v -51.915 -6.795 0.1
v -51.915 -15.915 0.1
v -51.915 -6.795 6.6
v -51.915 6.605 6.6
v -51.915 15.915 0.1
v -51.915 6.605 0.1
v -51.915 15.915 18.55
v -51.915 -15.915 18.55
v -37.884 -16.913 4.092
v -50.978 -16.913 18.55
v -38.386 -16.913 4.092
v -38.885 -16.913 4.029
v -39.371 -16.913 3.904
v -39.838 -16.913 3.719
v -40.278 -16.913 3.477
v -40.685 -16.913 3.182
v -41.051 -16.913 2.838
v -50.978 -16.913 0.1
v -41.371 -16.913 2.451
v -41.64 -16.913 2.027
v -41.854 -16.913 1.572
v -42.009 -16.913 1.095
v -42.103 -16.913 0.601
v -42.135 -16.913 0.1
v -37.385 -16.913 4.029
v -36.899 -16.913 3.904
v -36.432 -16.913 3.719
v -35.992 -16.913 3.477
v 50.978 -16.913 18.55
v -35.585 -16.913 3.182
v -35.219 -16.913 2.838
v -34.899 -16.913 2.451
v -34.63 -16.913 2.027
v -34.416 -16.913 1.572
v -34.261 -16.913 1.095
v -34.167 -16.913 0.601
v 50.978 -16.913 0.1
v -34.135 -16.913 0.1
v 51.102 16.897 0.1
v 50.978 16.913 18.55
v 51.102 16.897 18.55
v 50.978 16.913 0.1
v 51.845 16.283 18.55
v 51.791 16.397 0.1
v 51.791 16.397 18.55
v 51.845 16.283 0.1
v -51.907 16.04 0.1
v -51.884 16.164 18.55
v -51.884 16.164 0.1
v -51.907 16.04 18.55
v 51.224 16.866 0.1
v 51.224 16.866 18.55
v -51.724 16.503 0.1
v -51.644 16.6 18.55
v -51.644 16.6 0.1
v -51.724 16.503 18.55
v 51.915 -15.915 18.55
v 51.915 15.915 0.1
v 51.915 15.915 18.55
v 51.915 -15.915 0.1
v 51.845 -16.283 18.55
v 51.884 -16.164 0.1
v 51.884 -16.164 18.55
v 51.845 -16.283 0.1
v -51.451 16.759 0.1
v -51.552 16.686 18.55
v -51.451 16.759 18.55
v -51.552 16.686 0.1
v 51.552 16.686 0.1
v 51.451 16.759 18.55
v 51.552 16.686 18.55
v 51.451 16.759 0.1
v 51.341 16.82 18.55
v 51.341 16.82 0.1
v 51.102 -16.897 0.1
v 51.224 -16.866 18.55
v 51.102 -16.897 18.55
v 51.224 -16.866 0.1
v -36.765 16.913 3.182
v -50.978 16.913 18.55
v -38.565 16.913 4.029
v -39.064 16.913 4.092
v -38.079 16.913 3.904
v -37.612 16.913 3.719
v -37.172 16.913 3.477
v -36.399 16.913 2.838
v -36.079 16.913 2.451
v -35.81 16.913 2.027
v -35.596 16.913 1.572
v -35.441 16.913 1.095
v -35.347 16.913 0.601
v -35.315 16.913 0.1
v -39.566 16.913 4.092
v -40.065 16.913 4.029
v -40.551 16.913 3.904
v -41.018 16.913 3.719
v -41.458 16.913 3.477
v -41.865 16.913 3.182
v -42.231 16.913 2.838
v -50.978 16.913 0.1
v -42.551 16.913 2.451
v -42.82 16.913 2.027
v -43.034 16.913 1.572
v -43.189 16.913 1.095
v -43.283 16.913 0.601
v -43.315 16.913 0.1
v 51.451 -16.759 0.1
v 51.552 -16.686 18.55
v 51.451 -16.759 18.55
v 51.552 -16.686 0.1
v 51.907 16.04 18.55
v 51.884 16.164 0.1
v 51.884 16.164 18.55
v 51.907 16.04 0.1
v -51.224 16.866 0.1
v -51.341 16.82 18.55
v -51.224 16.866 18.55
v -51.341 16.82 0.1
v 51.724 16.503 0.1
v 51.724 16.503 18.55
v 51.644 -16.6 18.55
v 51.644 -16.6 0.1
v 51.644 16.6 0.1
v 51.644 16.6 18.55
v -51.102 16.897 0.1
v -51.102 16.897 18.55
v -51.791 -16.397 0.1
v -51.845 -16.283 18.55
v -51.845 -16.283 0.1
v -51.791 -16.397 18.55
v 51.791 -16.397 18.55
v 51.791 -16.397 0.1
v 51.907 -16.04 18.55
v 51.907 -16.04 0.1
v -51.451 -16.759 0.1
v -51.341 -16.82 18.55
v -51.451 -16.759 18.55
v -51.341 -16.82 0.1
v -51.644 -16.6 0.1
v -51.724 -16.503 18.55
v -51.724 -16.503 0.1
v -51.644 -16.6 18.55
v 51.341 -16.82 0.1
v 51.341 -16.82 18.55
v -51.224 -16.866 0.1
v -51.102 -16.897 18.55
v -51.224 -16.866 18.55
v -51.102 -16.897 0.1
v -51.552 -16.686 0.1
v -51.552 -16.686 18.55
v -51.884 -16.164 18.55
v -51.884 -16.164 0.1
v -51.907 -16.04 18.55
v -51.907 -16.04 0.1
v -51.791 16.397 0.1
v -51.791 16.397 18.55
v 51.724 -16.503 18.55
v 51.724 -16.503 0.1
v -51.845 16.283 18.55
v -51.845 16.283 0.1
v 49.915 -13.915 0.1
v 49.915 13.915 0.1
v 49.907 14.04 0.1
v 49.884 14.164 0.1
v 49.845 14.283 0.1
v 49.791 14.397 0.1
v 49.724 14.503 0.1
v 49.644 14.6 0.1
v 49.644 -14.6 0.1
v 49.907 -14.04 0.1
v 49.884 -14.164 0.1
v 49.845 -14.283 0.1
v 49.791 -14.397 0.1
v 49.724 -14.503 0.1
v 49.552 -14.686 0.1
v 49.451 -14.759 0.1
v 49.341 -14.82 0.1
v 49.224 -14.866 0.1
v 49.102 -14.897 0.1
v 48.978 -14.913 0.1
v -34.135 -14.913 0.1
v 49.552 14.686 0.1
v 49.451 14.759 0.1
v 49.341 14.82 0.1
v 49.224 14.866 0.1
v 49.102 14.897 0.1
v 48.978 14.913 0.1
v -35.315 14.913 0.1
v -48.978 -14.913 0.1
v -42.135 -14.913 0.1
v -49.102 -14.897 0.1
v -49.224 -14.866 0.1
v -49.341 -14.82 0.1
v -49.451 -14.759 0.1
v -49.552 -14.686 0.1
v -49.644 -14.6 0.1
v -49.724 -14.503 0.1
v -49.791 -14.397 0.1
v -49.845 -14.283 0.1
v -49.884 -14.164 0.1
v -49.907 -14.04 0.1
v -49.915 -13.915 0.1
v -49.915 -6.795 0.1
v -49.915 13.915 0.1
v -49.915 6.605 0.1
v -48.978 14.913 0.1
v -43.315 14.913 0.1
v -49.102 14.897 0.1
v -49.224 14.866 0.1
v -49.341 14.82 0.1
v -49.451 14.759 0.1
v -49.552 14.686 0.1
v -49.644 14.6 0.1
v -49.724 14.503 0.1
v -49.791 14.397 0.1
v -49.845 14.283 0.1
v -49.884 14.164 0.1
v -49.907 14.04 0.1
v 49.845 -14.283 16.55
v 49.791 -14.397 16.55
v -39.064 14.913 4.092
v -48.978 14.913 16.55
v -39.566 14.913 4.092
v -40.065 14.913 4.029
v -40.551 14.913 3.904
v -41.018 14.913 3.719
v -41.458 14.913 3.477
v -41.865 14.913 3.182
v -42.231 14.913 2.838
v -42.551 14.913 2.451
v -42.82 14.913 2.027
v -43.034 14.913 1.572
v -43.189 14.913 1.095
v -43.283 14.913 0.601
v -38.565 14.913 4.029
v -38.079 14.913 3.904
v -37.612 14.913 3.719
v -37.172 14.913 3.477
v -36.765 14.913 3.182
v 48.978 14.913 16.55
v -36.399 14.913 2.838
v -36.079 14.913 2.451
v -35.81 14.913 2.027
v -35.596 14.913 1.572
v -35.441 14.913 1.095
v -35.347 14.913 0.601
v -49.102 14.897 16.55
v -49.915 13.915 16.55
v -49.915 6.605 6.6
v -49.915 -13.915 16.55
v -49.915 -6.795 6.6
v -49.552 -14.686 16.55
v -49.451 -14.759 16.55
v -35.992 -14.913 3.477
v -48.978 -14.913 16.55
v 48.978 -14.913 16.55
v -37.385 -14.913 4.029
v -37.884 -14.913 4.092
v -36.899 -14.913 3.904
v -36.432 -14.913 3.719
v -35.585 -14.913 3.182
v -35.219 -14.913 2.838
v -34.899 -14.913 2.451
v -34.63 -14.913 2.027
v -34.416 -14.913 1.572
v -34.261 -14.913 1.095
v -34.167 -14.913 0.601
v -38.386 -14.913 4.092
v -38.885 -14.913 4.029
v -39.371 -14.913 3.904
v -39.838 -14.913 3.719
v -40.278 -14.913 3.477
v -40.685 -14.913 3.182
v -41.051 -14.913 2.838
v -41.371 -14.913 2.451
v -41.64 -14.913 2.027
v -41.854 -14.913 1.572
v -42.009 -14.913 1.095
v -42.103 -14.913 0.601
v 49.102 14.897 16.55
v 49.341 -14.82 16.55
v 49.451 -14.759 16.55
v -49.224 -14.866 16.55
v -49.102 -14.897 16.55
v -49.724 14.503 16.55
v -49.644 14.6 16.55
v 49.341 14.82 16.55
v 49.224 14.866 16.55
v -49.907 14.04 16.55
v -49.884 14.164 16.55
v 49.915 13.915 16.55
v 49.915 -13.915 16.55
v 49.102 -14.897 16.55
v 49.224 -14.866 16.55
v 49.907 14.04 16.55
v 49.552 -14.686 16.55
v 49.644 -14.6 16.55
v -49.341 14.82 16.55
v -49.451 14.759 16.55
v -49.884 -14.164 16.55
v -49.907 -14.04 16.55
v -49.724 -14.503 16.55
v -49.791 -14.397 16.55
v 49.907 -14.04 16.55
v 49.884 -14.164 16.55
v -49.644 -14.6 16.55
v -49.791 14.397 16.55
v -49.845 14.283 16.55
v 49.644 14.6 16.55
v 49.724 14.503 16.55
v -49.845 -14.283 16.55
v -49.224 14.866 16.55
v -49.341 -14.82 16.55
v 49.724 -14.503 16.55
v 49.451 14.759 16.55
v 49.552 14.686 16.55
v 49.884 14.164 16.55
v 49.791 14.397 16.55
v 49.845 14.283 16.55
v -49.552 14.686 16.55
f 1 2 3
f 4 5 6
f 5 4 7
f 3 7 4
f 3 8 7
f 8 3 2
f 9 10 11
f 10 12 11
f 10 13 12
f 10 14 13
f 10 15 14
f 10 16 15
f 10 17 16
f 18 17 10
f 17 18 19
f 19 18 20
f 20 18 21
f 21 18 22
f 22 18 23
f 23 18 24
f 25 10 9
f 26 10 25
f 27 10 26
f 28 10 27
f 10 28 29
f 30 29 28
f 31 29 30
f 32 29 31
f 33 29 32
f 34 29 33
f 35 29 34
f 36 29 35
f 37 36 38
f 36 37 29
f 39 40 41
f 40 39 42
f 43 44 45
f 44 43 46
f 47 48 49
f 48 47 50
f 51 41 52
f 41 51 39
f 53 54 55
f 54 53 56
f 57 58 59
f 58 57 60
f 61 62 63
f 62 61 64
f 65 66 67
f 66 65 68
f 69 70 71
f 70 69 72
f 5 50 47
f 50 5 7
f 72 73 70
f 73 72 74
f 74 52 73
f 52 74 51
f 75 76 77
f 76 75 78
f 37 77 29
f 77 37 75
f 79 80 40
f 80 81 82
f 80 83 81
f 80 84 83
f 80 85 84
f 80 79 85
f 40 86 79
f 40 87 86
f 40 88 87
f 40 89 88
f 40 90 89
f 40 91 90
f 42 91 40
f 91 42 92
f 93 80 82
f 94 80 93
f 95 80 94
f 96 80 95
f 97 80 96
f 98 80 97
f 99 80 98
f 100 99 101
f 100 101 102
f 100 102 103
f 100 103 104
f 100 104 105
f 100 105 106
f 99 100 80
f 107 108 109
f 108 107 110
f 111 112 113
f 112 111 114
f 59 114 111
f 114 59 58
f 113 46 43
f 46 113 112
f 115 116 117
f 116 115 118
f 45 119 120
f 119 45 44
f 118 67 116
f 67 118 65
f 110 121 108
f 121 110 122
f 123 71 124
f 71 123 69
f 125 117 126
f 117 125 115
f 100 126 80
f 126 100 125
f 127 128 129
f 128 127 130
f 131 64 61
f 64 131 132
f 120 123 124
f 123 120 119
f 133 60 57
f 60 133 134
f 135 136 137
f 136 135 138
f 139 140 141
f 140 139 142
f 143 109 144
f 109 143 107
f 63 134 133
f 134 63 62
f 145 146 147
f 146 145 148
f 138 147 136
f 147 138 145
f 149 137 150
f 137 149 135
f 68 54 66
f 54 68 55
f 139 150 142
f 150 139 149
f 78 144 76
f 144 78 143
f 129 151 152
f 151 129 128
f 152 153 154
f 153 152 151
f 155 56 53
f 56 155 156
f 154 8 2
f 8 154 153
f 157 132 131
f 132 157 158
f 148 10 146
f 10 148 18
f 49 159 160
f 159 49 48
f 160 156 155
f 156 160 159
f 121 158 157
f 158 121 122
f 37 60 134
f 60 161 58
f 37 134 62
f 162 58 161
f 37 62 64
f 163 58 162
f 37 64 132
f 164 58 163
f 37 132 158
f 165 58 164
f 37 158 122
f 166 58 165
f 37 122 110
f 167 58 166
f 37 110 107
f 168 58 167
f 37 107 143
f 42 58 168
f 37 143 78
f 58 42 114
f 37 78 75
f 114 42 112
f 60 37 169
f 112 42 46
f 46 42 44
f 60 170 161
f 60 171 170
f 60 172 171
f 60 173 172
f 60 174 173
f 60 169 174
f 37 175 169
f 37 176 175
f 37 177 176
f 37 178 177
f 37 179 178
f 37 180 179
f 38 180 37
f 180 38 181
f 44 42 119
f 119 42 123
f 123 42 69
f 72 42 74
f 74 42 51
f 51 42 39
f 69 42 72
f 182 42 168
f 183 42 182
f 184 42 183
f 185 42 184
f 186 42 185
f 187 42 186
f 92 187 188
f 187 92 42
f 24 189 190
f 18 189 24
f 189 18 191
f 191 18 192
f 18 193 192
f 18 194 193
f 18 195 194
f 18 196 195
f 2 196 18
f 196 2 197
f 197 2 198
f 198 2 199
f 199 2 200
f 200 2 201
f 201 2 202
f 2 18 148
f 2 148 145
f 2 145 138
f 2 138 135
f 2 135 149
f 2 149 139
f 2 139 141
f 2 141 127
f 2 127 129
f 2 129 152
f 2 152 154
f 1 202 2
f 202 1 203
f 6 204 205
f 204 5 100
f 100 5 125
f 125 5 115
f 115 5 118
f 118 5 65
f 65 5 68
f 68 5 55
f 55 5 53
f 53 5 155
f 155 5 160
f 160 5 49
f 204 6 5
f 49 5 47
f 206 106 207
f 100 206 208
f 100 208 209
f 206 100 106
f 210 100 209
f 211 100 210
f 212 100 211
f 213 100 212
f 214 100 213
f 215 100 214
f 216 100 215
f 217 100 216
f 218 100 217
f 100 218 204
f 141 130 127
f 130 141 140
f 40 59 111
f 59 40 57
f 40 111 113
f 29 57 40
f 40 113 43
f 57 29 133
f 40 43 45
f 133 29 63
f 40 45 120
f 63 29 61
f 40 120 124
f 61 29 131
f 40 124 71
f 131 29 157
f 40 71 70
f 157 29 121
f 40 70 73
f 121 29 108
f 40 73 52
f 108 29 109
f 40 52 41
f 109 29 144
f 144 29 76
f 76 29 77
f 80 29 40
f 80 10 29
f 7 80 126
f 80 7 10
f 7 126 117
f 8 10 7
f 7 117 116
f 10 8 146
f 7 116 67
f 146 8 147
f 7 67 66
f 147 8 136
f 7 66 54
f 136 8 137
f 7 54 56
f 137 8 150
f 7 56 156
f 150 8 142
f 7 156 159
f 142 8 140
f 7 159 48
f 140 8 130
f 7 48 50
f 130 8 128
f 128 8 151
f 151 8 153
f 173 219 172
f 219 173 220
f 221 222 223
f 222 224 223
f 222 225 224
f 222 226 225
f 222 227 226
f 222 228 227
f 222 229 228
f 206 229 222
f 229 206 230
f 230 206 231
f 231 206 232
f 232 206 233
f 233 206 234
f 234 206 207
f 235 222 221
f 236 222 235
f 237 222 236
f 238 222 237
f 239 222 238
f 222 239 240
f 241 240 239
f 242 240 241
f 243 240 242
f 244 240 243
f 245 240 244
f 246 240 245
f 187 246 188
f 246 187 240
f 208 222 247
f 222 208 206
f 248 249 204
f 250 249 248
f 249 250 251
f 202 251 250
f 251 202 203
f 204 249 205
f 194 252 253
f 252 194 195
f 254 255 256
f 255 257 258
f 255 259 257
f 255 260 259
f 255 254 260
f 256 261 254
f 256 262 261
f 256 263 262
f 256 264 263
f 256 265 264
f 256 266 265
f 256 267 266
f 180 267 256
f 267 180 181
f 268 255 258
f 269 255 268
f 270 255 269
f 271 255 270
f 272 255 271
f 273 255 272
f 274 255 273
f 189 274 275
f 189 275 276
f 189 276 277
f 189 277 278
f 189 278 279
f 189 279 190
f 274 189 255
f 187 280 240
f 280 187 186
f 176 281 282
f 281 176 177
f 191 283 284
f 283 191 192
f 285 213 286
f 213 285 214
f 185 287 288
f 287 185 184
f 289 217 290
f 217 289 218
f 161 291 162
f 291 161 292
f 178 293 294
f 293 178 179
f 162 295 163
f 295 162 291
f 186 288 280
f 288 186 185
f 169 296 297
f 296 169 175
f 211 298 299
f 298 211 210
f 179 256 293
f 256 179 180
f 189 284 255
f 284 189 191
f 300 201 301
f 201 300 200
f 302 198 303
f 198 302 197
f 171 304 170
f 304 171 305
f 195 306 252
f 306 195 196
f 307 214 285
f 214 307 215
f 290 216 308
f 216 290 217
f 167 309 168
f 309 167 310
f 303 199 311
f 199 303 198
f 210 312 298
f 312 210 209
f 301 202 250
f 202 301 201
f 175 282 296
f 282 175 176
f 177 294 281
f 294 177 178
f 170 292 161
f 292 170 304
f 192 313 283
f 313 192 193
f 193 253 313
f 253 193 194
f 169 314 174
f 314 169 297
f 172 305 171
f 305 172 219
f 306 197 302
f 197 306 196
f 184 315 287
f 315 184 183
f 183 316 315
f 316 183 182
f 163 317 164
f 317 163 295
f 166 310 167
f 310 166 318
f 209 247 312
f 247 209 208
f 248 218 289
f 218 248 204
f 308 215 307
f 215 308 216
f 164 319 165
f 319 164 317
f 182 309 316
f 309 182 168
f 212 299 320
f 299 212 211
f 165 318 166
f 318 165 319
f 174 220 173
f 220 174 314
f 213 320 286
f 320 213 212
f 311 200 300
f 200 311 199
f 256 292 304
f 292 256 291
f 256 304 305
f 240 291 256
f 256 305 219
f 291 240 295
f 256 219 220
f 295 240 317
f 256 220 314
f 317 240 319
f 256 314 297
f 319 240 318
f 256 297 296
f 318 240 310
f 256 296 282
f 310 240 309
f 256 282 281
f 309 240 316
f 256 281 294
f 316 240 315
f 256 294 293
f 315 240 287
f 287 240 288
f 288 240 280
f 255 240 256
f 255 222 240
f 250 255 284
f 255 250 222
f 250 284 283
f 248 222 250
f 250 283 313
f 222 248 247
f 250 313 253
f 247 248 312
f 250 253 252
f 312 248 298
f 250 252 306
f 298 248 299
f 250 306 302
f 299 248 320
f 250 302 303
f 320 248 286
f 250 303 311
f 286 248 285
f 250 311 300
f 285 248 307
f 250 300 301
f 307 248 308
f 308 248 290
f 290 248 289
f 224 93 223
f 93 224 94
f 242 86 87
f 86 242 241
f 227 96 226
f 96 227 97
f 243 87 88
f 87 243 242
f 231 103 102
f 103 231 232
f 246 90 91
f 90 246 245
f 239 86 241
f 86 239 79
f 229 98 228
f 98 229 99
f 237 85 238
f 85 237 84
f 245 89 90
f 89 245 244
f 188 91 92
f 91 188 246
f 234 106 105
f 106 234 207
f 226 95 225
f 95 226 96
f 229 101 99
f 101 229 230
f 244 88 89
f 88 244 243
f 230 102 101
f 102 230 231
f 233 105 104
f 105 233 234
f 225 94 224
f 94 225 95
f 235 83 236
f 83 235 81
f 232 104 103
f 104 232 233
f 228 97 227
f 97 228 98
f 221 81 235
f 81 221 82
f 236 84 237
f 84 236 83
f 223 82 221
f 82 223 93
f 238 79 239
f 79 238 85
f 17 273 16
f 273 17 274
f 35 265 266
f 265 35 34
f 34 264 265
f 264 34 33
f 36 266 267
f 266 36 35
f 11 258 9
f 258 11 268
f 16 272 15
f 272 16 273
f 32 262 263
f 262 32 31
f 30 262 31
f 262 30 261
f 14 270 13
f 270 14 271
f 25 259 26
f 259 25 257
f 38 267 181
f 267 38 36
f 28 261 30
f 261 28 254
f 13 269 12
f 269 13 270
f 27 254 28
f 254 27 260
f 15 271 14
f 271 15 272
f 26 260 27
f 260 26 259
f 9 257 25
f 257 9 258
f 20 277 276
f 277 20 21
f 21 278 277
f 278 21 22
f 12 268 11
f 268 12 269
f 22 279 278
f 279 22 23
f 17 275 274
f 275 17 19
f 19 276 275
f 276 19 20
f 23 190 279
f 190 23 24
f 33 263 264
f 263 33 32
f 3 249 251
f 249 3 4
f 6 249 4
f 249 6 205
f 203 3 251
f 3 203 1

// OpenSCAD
// file: usbA-C.scad
/* [Hidden] */

TWEAK = 1;

module make_USBA(location = "UNKNOWN")
{
     // true measurements of usb.
     PUNCH_DIA = 6 + TWEAK;
     PUNCH_WIDTH = 11.0 + TWEAK;
     PUNCH_DIST = PUNCH_WIDTH - PUNCH_DIA;
     PUNCH_LENGTH = 17.0;

     // this is the hole punch size
     USB_DIA = 1.92 + TWEAK/2;
     USB_WIDTH = 7.0 + TWEAK/2;
     USB_DIST = PUNCH_WIDTH - PUNCH_DIA;
     USB_LENGTH = 5.68;
    

    mUSB_DIA = (location == "ABOVE") ? +USB_DIA/2 : location == "BELOW" ? -USB_DIA/2: 0;
    
    translate([ 0, mUSB_DIA, 0])  
    {
         if ($preview)
         {
             color("PINK")
             translate( [-PUNCH_WIDTH , -mUSB_DIA, 0])  // one face to sit 'on the board'
             rotate([90, 90, 0])
             cube( [PUNCH_WIDTH * 2, PUNCH_WIDTH * 2, 0.1], center = false);    // targeting plane
         }
         
         //translate( [0, USB_DIA/2, 0])  // one face to sit 'on the board'
         {
             color("YELLOW", .3)
             hull()
             {
                 translate([ PUNCH_DIST /2, 0, 0 ])
                 cylinder(h = PUNCH_LENGTH, d = PUNCH_DIA, $fn=100);
                 
                 translate([ -PUNCH_DIST /2, 0, 0 ])
                 cylinder(h = PUNCH_LENGTH, d = PUNCH_DIA, $fn=100);
             }
             
             rotate([180, 0, 0])
             #hull()
             {
                 translate([ USB_DIST /2, 0, 0 ])
                 cylinder(h = USB_LENGTH, d = USB_DIA, $fn=100);
                 
                 translate([ -USB_DIST /2, 0, 0 ])
                 cylinder(h = USB_LENGTH, d = USB_DIA, $fn=100);
             }
         }
     }
}

module make_USBC( location = "UNKNOWN")
{
     PUNCH_DIA = 6.10 + TWEAK;
     PUNCH_WIDTH = 10.9 + TWEAK;
     PUNCH_DIST = PUNCH_WIDTH - PUNCH_DIA;
     PUNCH_LENGTH = 14.0;

    // true usb metal dimensions.
     USB_DIA = 2.54 + TWEAK/2;
     USB_WIDTH = 8.25 + TWEAK/2;
     USB_DIST = PUNCH_WIDTH - PUNCH_DIA;
     USB_LENGTH = 7.47;

    mUSB_DIA = (location == "ABOVE") ? +USB_DIA/2 : location == "BELOW" ? -USB_DIA/2: 0;
    
    translate([ 0, mUSB_DIA, 0])  
    {
         if ($preview)
         {
             color("GREY")
             translate( [-PUNCH_WIDTH , -mUSB_DIA, 0])  // one face to sit 'on the board'
             rotate([90, 90, 0])
             cube( [PUNCH_WIDTH * 2, PUNCH_WIDTH * 2, 0.1], center = false);    // targeting plane
         }
         
         //translate( [0, USB_DIA/2, 0])  // one face to sit 'on the board'
         {
             color("ORANGE", .3)
             hull()
             {
                 translate([ PUNCH_DIST /2, 0, 0 ])
                 cylinder(h = PUNCH_LENGTH, d = PUNCH_DIA, $fn=100);
                 
                 translate([ -PUNCH_DIST /2, 0, 0 ])
                 cylinder(h = PUNCH_LENGTH, d = PUNCH_DIA, $fn=100);
             }
             
             rotate([180, 0, 0])
             #hull()
             {
                 translate([ USB_DIST /2, 0, 0 ])
                 cylinder(h = USB_LENGTH, d = USB_DIA, $fn=100);
                 
                 translate([ -USB_DIST /2, 0, 0 ])
                 cylinder(h = USB_LENGTH, d = USB_DIA, $fn=100);
             }
         }
     }

}
translate([20, 0, 0])
make_USBA("ABOVE");
translate([40,0, 0])
make_USBA("CENTER");
translate([60, 0, 0])
make_USBA("BELOW");
/*
translate([ 0, 10, 0])
{
    translate([20, 0, 0])
    make_USBC("ABOVE");
    translate([40,0, 0])
    make_USBC("CENTER");
    translate([60, 0, 0])
    make_USBC("BELOW");
}
*/
//make_USBC("CENTER");
// main file
//outside dimensions of the box
use <usbA-C.scad>

wall_thickness = 4;     // total thickness of any wall

inside_dims= 1;
FUDGE = .5;

board_width  = 99.33;        //x dimension
board_length = 29.33;        //y dimension
board_height = 6.31;         //z MAX COMPONENT HEIGHT
board_thick = 1.58;

make_bottom = false;
make_top = true;

box_width  = board_width + (inside_dims ? wall_thickness : 0) + FUDGE;        //x dimension
box_length = board_length + (inside_dims ? wall_thickness : 0) + FUDGE;        //y dimension
box_height = board_height  + (inside_dims ? wall_thickness : 0) + 3;            //z dimension


$fn=50;
echo ("box_width= ", box_width, "box_length = ", box_length, "box_height =", box_height);

//additional parameters
corner_radius = 1;      // radius of box corners

post_diameter = 3.5;         // internal post for screws
hole_diameter = 2;           // size of screws for lid (0=no screws)
lid_thickness= 2;            // comment out if no lid required
lid_lip = 2; // 1.57 exact   // 0 makes lid flush to top
lid_tolerance = .5;          // shrink lid so not squeaky fit

fn=50;

// make 4 "posts" about 0,0,0 offset by +/-x +/-y 
module posts(x,y,z,h,r)
{
    translate([x,y,z]){         // move post to this location
        cylinder(r = r, h = h); // make one post
    }
    translate([-x,y,z]){        // move post to this location
        cylinder(r = r, h = h); // make one post
    }   
    translate([-x,-y,z]){       // move post to this location
        cylinder(r = r, h = h); // make one post
    }
    translate([x,-y,z]){        // move post to this location
        cylinder(r = r, h = h); // make one post
    }    
}


x_inside = (box_width/2  - corner_radius - wall_thickness); 
y_inside = (box_length/2 - corner_radius - wall_thickness);
z_inside_top = (box_height - wall_thickness);

if (make_bottom)
{
    translate([ 0, 0, -box_height +.1])
    {
        difference () 
        {
            union()
            {
                difference() // make 2 boxes one inside the other and remove "inside box" from "outside box"
                {
                 
                    // use posts to define OUTSIDE of a solid box centered on 0,0
                    hull(){
                        // outside of box. This sits on 0,0,0 center
                        posts(  
                            x=(box_width/2  - corner_radius),
                            y=(box_length/2 - corner_radius),
                            z= 0,
                            h= box_height,
                            r = corner_radius);
                    }
                        
                    // use posts to define INSIDE of a solid box centered on 0,0
                    
                    hull(){
                        posts(
                            x= x_inside,
                            y= y_inside,
                            z= wall_thickness, // move up from 0,0,0 to create bottom
                            h= box_height,
                            r = corner_radius);
                    }

                    // now we have a simple hollow box.
                    
                    
                    // notch out the lip on the top/open face
                    // it cuts out enough to expose the top of the screw posts created later on 
                    
                    hull(){
                        posts(
                            x=(box_width/2  - corner_radius - lid_lip),
                            y=(box_length/2 - corner_radius - lid_lip),
                            z= box_height - lid_thickness,
                            h= lid_thickness + 1,
                            r = corner_radius);
                    }
                    //20.71
                    translate([x_inside - 28.11 - 1.6 + 9.09, -y_inside   , z_inside_top + lid_thickness])
                    rotate([90, 0, 0])
                    make_USBC( location = "BELOW");
                    
                    //7.11
                    translate([x_inside - 14.66 + 7.55, y_inside   , z_inside_top + lid_thickness])
                    rotate([-90, 0, 0])
                    make_USBA( location = "ABOVE"); // negative rotation cause below to be "above"
                    
                 }
                 if ($preview)
                 {
                     // make a virtual board.
                     color("BLUE", .2)
                     translate([-board_width/2, -board_length/2, z_inside_top + lid_thickness ]) 
                     cube ([ board_width, board_length, board_thick], center = false);
                }
             }     


             // generate a cross section viewer
              if (0) 
              {
                translate([ 0, 0, -25])
                cube ([ 100,100,100], center=false);
              }
          }
          #postNscrews();

     }
        
}

top_height = 18.45;

if (make_top)
{
    translate([ 0, 0, top_height+.1])
    rotate([0, -180, 0])

    difference () 
    {
        union()
        {
            difference() // make 2 boxes one inside the other and remove "inside box" from "outside box"
            {
             
                // use posts to define OUTSIDE of a solid box centered on 0,0
                hull(){
                    // outside of box. This sits on 0,0,0 center
                    posts(  
                        x=(box_width/2  - corner_radius),
                        y=(box_length/2 - corner_radius),
                        z= 0,
                        h= top_height,
                        r = corner_radius);
                }
                    
                
                //punch out.
                hull(){
                    posts(
                        x=(box_width/2  - corner_radius - lid_lip),
                        y=(box_length/2 - corner_radius - lid_lip),
                        z= lid_thickness,
                        h= top_height,
                        r = corner_radius);
                }
                // punch out switch 1
                translate([box_width/2 - 12.6, box_length/2, top_height ])
                rotate([90, 0, 0])
                #cylinder(d=8, h = 10);
                
                // punch out switch 2
                translate([box_width/2 - 13.78, -box_length/2 + 5, top_height ])
                rotate([90, 0, 0])
                #cylinder(d=8, h = 10);

                // punch out USB-a
                translate([box_width/2 -5 , -box_length/2 + 10.12 , top_height - 6.5 ])
                #cube([ 10, 13.4, 30]);
                        
            }
             
             
             if ($preview)
             {
                 // make a virtual board.
                 color("BLUE", .2)
                 translate([-board_width/2, -board_length/2, z_inside_top + lid_thickness ]) 
                 cube ([ board_width, board_length, board_thick], center = false);
            }
         }     
         // generate a cross section viewer
          if (0) 
          {
            translate([ 0, 0, -25])
            cube ([ 100,100,100], center=false);
          }
    }
}


module postNscrews()
{
    // add screw in posts and drill out the center for screws
    difference () {
        posts( 
            x=(box_width/2  - wall_thickness/2 - post_diameter/2),
            y=(box_length/2 - wall_thickness/2 - post_diameter/2),
            z= wall_thickness - .5,
            h= box_height - wall_thickness - lid_thickness +.5,
            r = post_diameter/2);

         // ADD the holes for the screws.
        posts( 
            x=(box_width/2  - wall_thickness/2 - post_diameter/2),
            y=(box_length/2 - wall_thickness/2 - post_diameter/2),
            z= wall_thickness - .5,
            h= box_height - wall_thickness - lid_thickness + 5,
            r = hole_diameter/2);
    }
}

/*
// create a lid
translate([10 + box_width, 0, 0]) 
difference()
{
    hull()
    {
            // make undrilled lid
            posts(
                x=(box_width/2  - corner_radius - wall_thickness/2 - lid_tolerance),
                y=(box_length/2 - corner_radius - wall_thickness/2 - lid_tolerance),
                z= 0, // move up to create bottom
                h= lid_thickness,
                r = corner_radius);
            
            // drill outholes for the screws via difference
            // ADD the holes for the screws.
    }
    color("red")
    // drill the holes in the lid
    posts( 
    x=(box_width/2  - wall_thickness/2 - post_diameter/2),
    y=(box_length/2 - wall_thickness/2 - post_diameter/2),
    z= 0,
    h= lid_thickness,
    r = hole_diameter/2 +.5);

}

*/
